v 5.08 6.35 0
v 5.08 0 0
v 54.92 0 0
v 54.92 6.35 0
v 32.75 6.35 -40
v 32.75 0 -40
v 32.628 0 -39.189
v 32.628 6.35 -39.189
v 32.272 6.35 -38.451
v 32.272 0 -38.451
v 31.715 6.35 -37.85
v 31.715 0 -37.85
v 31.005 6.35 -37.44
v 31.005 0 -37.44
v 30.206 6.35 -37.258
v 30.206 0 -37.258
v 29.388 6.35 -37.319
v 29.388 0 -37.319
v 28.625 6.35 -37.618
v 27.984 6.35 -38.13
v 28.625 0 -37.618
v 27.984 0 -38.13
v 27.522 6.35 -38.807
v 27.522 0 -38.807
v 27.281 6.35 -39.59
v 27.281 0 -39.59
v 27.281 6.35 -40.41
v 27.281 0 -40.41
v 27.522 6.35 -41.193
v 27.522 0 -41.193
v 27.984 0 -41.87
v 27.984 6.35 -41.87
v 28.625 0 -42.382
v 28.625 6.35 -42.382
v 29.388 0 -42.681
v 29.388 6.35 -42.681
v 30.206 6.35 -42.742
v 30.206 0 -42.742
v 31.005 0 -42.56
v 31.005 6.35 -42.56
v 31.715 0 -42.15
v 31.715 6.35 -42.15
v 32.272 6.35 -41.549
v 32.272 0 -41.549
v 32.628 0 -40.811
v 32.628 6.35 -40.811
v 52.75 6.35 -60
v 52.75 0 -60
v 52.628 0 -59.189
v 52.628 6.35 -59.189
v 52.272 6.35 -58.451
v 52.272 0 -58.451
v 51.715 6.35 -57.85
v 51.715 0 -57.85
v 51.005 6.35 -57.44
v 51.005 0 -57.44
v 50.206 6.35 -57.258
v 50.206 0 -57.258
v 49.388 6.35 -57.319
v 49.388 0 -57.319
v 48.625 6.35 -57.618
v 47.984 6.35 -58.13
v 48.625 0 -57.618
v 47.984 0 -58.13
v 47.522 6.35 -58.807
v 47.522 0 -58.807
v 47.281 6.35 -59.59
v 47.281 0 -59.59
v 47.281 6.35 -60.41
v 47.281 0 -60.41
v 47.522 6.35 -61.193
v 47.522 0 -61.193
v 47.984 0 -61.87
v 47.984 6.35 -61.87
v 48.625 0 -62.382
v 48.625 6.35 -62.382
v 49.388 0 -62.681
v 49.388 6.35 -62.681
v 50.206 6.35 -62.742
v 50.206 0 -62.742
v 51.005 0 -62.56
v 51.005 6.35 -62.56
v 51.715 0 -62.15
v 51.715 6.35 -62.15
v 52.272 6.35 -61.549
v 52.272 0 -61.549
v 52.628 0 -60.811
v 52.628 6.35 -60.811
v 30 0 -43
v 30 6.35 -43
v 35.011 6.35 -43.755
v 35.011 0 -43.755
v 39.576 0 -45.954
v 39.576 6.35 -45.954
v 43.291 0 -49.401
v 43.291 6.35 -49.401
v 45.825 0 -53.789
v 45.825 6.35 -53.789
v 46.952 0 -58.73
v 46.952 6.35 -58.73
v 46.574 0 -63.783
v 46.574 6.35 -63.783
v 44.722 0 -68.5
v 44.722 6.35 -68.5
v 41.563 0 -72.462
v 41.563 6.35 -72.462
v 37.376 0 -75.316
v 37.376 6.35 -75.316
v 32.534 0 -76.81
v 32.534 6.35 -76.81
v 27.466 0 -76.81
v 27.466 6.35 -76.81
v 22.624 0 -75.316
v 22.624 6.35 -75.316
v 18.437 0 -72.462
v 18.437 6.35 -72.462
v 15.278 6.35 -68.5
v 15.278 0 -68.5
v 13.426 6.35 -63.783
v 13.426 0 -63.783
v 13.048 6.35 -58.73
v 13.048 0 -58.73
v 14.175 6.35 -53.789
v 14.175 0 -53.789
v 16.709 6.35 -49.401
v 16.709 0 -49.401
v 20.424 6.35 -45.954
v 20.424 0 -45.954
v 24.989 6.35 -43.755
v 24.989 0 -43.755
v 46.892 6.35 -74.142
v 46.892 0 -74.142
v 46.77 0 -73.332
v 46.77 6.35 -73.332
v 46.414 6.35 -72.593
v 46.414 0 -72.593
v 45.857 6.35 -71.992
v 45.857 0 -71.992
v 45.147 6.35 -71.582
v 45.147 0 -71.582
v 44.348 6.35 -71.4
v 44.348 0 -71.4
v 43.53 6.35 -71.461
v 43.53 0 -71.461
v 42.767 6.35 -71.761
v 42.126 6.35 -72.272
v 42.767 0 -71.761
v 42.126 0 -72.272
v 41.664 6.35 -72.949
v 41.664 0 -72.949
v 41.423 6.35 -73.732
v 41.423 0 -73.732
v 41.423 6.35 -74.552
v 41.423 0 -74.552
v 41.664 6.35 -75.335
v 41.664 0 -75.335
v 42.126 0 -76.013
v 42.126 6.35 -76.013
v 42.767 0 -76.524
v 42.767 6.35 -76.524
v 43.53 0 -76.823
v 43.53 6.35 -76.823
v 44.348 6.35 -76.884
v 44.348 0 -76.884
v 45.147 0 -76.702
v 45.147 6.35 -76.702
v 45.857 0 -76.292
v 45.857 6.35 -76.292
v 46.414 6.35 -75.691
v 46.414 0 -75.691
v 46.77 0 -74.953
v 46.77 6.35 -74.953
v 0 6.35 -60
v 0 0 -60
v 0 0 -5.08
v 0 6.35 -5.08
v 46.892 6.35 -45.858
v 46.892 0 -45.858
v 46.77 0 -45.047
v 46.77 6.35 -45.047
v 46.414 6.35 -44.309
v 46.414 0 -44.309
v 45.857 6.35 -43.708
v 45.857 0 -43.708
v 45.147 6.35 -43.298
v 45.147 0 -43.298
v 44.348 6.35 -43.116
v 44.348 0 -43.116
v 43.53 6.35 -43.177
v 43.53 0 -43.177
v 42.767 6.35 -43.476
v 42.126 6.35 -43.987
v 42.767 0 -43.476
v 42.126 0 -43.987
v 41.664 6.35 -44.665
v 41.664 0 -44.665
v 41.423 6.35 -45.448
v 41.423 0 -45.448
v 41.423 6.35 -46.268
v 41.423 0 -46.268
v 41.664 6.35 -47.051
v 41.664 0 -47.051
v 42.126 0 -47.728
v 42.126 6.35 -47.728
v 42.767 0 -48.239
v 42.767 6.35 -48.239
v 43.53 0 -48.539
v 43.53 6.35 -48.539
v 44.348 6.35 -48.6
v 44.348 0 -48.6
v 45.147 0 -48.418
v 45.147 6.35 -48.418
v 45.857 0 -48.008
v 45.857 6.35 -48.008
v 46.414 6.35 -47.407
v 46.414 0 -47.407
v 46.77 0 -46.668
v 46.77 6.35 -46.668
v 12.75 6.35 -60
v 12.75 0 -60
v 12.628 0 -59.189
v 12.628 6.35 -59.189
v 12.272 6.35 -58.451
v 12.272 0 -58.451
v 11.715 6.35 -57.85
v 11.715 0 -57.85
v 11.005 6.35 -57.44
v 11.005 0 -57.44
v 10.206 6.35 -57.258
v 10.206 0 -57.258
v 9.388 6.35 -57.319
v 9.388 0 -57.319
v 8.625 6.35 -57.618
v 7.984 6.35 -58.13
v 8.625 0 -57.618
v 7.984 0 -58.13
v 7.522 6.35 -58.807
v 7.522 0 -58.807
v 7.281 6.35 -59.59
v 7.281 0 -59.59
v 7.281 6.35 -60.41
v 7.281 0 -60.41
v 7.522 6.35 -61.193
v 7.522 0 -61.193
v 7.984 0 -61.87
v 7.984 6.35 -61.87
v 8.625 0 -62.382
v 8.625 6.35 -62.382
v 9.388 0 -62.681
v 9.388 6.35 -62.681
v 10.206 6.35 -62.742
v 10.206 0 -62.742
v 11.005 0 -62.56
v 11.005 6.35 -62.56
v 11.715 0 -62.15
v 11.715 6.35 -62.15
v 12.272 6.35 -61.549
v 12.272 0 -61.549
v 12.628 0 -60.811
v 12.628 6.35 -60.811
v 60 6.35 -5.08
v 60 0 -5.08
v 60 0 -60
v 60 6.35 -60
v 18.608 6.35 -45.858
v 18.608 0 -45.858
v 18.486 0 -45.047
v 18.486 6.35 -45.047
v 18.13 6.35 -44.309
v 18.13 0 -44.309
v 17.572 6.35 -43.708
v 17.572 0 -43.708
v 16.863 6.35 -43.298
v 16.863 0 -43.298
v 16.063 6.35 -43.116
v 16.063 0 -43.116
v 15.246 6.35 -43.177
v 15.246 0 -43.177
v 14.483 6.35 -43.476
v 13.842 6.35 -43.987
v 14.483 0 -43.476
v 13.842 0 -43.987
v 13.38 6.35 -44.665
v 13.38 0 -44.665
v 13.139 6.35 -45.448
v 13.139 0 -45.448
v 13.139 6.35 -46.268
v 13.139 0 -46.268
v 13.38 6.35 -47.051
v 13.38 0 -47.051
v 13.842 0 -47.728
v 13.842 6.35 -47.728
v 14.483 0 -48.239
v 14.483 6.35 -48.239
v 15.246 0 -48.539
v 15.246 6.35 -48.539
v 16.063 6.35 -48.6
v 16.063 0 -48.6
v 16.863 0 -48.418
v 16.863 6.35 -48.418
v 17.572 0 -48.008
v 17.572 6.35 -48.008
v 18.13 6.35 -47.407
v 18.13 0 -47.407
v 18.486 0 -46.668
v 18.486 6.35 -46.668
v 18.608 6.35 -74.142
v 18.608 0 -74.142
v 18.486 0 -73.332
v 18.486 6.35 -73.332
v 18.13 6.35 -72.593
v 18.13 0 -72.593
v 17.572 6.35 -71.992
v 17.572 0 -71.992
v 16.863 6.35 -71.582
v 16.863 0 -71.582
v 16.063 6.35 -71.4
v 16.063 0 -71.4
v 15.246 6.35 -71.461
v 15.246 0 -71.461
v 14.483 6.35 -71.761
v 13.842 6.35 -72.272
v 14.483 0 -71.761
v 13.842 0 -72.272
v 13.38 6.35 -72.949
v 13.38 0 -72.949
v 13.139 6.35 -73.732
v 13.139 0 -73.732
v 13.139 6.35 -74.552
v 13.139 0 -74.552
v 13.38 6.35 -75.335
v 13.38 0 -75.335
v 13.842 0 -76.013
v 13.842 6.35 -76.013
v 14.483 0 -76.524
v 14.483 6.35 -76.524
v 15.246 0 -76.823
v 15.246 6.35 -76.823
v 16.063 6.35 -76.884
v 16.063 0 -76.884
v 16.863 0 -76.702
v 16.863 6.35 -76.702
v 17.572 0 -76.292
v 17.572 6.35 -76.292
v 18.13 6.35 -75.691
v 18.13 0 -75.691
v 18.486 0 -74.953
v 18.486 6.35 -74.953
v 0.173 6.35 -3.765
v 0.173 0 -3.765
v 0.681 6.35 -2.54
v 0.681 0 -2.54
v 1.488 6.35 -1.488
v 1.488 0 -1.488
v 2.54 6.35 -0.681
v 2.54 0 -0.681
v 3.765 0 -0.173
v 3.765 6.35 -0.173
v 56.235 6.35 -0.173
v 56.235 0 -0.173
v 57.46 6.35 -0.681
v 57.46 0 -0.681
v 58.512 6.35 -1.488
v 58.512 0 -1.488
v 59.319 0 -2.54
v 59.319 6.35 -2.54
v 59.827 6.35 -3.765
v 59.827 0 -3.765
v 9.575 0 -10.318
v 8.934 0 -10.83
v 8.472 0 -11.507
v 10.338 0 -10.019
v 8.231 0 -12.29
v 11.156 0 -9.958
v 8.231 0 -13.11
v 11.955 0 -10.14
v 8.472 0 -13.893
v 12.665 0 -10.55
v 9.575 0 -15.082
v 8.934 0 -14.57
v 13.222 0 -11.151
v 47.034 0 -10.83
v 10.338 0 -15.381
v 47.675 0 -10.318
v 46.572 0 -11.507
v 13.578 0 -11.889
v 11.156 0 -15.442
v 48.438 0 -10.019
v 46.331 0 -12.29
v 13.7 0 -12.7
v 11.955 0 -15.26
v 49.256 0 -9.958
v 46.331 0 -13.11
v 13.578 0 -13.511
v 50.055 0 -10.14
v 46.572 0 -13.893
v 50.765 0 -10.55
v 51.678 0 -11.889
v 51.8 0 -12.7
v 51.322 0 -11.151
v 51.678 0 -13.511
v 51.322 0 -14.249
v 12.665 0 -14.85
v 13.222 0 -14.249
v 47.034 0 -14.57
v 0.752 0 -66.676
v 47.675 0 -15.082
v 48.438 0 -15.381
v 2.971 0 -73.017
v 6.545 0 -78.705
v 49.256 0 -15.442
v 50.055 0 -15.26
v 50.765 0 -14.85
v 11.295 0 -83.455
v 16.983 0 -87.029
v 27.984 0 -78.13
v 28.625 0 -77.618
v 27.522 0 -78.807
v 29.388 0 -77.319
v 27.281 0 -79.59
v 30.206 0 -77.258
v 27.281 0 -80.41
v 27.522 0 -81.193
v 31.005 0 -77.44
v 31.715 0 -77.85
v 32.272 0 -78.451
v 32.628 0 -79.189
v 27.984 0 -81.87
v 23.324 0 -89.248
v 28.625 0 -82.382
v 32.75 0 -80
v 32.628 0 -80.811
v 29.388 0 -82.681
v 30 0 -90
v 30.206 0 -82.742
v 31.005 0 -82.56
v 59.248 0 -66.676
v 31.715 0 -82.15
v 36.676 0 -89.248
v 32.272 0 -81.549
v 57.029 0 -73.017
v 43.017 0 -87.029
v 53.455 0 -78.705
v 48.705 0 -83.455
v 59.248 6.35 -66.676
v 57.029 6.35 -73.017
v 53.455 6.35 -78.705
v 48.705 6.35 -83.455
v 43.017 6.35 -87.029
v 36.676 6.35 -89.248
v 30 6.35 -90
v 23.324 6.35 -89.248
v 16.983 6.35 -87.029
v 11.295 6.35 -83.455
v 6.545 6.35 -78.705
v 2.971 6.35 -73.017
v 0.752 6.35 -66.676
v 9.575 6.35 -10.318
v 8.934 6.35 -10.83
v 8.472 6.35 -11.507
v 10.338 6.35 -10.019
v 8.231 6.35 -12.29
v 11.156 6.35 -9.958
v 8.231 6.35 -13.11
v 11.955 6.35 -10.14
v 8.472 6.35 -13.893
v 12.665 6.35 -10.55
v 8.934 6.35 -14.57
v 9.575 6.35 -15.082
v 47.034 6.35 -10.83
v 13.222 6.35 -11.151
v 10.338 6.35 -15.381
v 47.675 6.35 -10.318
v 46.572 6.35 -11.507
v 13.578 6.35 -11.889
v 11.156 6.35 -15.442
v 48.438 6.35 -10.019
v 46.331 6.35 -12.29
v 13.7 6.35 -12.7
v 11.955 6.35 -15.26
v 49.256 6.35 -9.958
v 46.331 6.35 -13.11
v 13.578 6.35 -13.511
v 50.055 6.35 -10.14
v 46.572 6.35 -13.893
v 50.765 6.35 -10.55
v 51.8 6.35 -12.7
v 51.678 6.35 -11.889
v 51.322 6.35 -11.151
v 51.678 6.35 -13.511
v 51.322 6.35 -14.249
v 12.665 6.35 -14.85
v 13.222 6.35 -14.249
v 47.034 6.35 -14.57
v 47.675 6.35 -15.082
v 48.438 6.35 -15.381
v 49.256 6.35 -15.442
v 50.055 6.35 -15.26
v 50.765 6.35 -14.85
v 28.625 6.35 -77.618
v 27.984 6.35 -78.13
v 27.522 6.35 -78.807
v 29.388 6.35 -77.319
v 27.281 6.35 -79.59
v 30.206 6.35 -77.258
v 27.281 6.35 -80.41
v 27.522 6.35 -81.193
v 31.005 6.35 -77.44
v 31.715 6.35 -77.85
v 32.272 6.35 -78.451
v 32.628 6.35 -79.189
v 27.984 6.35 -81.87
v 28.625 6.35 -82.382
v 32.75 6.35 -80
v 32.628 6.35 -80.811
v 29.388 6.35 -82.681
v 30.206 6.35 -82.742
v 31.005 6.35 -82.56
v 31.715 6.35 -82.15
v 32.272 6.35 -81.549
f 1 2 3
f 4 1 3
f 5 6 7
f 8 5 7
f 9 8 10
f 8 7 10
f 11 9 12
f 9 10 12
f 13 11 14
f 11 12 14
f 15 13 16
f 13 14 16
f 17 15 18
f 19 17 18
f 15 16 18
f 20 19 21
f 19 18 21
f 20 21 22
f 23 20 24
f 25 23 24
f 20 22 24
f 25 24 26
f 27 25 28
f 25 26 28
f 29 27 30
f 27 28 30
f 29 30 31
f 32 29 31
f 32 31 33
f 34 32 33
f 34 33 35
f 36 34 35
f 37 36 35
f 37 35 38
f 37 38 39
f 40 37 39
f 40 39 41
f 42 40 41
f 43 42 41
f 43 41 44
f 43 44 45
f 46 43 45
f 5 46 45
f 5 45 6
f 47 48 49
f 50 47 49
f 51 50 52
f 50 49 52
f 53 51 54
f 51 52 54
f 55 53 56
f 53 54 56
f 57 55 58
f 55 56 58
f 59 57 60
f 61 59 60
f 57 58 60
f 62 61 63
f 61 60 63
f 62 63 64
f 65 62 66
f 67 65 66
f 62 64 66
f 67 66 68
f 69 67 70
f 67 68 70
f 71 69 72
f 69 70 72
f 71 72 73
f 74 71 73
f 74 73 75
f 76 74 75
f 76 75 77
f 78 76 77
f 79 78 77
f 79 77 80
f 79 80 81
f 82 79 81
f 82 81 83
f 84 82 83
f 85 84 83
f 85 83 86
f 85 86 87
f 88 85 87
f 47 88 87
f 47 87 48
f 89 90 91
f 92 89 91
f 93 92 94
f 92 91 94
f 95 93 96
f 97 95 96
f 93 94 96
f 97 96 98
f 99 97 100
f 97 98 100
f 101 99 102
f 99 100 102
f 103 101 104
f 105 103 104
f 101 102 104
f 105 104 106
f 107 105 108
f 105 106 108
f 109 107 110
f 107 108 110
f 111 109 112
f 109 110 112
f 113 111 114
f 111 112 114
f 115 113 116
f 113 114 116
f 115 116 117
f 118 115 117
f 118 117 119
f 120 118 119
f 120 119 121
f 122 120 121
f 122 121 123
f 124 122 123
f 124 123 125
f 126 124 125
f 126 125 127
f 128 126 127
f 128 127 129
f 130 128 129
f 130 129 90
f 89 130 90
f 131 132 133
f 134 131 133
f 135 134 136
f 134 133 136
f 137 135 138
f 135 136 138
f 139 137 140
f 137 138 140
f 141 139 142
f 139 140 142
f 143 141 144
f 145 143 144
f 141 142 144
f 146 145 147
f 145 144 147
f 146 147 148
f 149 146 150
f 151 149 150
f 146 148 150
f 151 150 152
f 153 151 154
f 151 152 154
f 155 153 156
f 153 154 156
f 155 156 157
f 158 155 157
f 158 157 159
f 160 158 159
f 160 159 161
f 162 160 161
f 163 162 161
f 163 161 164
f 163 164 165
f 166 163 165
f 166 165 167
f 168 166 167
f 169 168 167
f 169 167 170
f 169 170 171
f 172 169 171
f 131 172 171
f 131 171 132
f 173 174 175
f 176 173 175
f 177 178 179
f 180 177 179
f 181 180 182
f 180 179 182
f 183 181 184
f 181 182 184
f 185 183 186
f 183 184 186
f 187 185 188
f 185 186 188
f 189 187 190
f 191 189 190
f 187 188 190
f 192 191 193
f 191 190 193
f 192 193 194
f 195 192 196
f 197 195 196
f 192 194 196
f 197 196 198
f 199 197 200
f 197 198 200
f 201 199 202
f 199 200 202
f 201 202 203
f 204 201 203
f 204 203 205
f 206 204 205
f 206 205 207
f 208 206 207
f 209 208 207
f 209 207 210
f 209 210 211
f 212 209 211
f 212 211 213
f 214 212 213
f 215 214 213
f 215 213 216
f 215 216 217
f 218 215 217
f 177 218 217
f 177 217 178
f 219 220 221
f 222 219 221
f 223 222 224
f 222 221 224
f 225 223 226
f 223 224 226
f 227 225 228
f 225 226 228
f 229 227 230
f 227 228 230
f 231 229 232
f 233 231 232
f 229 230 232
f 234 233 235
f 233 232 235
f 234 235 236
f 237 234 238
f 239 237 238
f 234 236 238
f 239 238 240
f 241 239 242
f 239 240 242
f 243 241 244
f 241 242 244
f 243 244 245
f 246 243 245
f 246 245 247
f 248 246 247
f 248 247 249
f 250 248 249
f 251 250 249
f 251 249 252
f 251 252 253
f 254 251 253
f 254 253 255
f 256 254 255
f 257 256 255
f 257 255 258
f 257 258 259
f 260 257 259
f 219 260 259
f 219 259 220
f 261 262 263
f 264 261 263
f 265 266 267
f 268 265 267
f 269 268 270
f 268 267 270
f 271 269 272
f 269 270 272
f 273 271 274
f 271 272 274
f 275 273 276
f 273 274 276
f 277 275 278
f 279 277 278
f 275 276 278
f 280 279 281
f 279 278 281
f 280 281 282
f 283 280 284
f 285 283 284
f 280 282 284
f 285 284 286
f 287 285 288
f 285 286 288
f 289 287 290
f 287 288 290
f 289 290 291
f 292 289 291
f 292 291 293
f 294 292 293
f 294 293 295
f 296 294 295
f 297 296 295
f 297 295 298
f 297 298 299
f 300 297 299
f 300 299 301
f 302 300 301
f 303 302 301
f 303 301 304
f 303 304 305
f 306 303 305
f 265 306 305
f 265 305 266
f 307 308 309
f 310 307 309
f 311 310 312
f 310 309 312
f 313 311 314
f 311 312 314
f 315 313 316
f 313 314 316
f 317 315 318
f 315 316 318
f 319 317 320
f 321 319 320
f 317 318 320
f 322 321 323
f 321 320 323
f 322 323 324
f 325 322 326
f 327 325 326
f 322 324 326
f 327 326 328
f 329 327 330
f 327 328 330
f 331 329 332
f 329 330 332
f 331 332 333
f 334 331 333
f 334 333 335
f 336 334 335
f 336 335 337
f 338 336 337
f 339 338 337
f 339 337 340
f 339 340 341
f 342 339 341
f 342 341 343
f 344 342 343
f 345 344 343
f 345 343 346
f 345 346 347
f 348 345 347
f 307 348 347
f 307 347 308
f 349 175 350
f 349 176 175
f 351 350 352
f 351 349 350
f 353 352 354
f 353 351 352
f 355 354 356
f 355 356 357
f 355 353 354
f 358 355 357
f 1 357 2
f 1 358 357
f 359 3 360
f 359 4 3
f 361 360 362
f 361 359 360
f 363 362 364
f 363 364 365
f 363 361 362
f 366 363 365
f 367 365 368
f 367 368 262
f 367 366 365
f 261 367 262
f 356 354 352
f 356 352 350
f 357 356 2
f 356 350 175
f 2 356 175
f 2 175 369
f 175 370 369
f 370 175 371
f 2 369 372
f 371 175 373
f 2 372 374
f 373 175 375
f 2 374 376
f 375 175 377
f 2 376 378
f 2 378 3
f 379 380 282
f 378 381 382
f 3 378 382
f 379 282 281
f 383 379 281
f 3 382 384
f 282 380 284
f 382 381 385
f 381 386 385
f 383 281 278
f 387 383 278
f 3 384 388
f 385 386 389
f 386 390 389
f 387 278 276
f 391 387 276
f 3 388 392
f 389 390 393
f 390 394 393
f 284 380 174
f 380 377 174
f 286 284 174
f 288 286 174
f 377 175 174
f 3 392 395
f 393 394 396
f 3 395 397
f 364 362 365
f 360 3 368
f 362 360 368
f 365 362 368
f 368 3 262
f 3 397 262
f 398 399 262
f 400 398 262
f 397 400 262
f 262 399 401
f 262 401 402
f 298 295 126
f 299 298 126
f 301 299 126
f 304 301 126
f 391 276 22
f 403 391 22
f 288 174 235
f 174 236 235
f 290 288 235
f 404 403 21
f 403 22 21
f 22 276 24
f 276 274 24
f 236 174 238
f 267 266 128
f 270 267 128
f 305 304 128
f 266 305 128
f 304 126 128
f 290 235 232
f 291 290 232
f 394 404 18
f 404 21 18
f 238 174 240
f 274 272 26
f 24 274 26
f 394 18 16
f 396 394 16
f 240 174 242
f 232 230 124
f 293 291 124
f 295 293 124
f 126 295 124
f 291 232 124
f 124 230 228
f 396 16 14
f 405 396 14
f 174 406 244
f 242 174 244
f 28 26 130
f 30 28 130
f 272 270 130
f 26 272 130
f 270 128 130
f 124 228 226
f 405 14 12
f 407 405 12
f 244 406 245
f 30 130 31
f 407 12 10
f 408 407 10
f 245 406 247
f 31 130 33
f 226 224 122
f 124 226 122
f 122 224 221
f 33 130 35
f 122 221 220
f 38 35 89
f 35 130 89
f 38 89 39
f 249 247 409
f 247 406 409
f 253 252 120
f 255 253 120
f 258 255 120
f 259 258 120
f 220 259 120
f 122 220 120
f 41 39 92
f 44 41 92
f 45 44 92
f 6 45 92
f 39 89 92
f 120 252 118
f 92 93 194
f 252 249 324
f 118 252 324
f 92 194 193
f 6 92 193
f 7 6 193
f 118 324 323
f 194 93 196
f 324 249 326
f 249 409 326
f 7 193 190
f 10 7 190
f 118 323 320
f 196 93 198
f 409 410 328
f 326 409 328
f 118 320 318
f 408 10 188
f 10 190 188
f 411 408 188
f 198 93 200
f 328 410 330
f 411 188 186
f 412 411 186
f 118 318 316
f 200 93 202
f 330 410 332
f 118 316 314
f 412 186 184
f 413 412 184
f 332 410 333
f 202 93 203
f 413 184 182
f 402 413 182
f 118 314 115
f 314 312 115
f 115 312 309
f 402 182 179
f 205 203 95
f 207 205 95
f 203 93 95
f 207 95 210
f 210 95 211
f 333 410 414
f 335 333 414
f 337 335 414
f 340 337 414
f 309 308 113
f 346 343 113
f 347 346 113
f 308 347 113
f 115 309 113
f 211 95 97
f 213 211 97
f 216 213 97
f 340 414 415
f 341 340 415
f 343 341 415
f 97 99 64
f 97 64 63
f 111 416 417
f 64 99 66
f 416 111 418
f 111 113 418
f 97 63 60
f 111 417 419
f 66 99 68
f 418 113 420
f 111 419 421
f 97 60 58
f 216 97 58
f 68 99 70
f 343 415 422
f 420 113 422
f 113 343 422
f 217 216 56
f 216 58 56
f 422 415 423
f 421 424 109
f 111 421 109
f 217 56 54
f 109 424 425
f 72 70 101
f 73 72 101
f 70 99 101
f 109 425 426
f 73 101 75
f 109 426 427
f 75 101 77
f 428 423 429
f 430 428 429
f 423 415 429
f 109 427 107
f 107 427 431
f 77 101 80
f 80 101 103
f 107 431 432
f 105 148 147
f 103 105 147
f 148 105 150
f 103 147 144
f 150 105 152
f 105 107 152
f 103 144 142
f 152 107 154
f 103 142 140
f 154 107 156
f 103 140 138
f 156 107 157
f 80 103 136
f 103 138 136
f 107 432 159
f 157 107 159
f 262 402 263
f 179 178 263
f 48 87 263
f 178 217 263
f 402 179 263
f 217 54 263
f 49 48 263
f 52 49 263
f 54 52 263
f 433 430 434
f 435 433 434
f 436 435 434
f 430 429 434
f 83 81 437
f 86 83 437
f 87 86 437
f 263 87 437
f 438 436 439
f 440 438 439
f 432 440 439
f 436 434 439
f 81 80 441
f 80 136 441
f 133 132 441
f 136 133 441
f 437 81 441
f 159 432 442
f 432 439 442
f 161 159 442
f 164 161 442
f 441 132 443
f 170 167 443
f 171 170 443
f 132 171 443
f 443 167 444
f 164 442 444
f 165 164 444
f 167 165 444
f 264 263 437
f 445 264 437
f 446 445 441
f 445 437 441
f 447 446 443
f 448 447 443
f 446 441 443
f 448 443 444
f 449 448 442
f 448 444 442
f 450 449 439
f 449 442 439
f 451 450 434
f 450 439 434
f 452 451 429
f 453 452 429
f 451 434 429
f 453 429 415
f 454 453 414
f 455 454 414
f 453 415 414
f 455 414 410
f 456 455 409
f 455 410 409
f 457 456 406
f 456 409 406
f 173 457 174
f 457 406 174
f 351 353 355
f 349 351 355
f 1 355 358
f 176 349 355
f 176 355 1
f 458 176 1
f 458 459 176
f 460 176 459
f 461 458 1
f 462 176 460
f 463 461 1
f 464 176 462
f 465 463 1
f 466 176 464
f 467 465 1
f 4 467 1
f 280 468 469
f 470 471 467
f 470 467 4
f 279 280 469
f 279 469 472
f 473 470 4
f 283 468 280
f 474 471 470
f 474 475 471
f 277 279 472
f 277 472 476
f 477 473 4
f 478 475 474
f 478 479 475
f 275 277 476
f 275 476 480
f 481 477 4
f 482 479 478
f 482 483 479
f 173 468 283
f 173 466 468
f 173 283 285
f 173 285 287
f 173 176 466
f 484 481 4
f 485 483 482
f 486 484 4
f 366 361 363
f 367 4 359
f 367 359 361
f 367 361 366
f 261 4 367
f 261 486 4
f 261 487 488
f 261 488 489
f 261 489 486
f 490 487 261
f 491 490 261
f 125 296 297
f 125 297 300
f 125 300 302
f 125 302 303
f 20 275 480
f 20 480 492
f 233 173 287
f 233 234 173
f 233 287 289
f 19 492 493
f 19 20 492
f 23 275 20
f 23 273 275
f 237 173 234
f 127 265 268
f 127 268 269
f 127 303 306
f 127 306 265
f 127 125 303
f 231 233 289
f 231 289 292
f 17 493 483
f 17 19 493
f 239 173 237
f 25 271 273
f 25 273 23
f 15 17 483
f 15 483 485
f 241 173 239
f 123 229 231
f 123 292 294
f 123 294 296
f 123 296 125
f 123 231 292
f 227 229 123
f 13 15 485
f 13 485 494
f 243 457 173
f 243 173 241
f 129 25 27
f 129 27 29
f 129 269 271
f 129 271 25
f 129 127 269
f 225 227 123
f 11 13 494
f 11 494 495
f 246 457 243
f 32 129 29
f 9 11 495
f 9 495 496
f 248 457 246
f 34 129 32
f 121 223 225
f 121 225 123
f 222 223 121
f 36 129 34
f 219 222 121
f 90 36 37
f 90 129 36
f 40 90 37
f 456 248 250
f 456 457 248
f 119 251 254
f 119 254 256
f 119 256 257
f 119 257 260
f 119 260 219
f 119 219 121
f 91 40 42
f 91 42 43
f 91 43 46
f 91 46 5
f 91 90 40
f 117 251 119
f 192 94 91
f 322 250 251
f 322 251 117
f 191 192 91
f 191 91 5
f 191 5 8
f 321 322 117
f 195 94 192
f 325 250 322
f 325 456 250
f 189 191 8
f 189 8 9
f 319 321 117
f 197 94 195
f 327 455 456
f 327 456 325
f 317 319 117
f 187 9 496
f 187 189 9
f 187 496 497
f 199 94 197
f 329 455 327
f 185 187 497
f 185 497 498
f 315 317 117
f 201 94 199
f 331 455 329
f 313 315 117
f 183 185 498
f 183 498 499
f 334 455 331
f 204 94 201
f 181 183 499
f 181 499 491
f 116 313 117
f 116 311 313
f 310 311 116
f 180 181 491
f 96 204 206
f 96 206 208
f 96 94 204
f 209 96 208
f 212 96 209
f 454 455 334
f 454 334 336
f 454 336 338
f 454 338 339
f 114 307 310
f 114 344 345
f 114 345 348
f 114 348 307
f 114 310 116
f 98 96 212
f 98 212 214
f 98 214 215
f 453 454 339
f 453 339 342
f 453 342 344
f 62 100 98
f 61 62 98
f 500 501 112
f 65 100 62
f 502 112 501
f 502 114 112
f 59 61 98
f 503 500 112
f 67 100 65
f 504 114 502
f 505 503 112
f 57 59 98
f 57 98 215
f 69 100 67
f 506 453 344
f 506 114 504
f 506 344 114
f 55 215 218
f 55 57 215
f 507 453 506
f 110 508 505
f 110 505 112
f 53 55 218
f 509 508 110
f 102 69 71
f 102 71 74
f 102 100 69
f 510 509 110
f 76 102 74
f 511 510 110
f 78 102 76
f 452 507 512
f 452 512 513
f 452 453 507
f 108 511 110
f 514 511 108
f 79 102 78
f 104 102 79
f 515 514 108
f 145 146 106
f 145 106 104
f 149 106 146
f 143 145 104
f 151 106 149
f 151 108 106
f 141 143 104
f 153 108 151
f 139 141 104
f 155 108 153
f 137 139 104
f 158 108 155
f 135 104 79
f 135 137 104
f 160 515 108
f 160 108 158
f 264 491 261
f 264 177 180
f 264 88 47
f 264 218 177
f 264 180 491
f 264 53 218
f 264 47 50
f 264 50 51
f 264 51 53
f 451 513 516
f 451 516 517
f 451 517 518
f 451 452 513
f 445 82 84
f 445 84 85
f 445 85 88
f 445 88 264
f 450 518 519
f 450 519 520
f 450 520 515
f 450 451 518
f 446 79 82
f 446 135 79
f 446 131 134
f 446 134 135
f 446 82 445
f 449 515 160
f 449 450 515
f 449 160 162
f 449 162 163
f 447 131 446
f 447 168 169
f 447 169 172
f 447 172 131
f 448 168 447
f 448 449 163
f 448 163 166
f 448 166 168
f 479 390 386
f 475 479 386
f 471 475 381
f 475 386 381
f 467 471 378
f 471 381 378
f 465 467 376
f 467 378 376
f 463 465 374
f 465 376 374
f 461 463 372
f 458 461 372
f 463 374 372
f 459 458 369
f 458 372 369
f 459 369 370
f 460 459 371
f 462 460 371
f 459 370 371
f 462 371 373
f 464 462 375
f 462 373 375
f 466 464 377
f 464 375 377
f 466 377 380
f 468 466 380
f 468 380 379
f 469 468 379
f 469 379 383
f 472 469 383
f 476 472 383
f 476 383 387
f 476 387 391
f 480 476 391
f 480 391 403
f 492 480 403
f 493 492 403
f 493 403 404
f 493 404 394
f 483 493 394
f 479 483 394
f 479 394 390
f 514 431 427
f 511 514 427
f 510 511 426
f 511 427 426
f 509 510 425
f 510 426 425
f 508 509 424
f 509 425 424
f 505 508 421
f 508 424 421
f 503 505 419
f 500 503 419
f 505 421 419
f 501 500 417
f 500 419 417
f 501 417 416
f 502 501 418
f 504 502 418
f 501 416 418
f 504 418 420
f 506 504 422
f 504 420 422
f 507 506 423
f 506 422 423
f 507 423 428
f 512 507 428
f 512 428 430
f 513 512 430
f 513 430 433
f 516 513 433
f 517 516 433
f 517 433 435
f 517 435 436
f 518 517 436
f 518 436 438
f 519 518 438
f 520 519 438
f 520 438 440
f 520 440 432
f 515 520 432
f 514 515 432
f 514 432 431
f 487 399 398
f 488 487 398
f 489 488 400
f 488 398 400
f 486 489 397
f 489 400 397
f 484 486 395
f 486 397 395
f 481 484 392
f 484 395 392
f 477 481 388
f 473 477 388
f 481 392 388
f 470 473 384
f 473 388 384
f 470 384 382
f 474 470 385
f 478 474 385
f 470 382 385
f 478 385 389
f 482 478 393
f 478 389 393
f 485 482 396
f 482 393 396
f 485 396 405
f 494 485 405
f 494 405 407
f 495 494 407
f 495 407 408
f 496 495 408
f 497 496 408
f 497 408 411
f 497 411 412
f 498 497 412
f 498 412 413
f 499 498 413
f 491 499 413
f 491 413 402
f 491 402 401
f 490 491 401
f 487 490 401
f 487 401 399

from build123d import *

# Parameters (mm, degrees)
BOSS_EXTRUDE1_DEPTH  = 6.35
SKETCH2_R            = 17
CUT_EXTRUDE1_DEPTH   = 109.352768769
M5_CLEARANCE_HOLE1_D = 5.5
M5_CLEARANCE_HOLE2_D = 5.5
FILLET1_R            = 5.08


with BuildPart() as part:
    # Sketch1 → Boss-Extrude1 (new body)
    with BuildSketch(Plane(origin=(0, 0, 0), x_dir=(1, 0, 0), z_dir=(0, 1, 0))):
        with BuildLine():
            Line((0, 60), (0, 0))
            Line((0, 0), (60, 0))
            Line((60, 0), (60, 60))
            ThreePointArc((60, 60), (30, 90), (0, 60))
        make_face()
    extrude(amount=BOSS_EXTRUDE1_DEPTH)

    # Sketch2 → Cut-Extrude1 (cut, through all)
    with BuildSketch(Plane(origin=(0, 6.35, 0), x_dir=(1, 0, 0), z_dir=(0, 1, 0))):
        with Locations(Location((30, 60, 0), (0, 0, 270))):
            Circle(SKETCH2_R)
    extrude(amount=-CUT_EXTRUDE1_DEPTH, mode=Mode.SUBTRACT)

    # M5 Clearance Hole1 (through all)
    with Locations(Plane(origin=(0, 6.35, 0), x_dir=(-1, 0, 0), z_dir=(0, 1, 0))):
        with Locations((-15.857864376, -74.142135624), (-44.142135624, -45.857864376), (-44.142135624, -74.142135624), (-15.857864376, -45.857864376), (-30, -80), (-50, -60), (-30, -40), (-10, -60)):
            Hole(M5_CLEARANCE_HOLE1_D / 2)

    # M5 Clearance Hole2 (through all)
    with Locations(Plane(origin=(0, 6.35, 0), x_dir=(-1, 0, 0), z_dir=(0, 1, 0))):
        with Locations((-10.95, -12.7), (-49.05, -12.7)):
            Hole(M5_CLEARANCE_HOLE2_D / 2)

    # Fillet1
    fillet1_edges = [part.edges().sort_by_distance(p)[0] for p in [
        (60, 3.175, 0),
        (0, 3.175, 0),
    ]]
    fillet(fillet1_edges, radius=FILLET1_R)


solid = part.part
